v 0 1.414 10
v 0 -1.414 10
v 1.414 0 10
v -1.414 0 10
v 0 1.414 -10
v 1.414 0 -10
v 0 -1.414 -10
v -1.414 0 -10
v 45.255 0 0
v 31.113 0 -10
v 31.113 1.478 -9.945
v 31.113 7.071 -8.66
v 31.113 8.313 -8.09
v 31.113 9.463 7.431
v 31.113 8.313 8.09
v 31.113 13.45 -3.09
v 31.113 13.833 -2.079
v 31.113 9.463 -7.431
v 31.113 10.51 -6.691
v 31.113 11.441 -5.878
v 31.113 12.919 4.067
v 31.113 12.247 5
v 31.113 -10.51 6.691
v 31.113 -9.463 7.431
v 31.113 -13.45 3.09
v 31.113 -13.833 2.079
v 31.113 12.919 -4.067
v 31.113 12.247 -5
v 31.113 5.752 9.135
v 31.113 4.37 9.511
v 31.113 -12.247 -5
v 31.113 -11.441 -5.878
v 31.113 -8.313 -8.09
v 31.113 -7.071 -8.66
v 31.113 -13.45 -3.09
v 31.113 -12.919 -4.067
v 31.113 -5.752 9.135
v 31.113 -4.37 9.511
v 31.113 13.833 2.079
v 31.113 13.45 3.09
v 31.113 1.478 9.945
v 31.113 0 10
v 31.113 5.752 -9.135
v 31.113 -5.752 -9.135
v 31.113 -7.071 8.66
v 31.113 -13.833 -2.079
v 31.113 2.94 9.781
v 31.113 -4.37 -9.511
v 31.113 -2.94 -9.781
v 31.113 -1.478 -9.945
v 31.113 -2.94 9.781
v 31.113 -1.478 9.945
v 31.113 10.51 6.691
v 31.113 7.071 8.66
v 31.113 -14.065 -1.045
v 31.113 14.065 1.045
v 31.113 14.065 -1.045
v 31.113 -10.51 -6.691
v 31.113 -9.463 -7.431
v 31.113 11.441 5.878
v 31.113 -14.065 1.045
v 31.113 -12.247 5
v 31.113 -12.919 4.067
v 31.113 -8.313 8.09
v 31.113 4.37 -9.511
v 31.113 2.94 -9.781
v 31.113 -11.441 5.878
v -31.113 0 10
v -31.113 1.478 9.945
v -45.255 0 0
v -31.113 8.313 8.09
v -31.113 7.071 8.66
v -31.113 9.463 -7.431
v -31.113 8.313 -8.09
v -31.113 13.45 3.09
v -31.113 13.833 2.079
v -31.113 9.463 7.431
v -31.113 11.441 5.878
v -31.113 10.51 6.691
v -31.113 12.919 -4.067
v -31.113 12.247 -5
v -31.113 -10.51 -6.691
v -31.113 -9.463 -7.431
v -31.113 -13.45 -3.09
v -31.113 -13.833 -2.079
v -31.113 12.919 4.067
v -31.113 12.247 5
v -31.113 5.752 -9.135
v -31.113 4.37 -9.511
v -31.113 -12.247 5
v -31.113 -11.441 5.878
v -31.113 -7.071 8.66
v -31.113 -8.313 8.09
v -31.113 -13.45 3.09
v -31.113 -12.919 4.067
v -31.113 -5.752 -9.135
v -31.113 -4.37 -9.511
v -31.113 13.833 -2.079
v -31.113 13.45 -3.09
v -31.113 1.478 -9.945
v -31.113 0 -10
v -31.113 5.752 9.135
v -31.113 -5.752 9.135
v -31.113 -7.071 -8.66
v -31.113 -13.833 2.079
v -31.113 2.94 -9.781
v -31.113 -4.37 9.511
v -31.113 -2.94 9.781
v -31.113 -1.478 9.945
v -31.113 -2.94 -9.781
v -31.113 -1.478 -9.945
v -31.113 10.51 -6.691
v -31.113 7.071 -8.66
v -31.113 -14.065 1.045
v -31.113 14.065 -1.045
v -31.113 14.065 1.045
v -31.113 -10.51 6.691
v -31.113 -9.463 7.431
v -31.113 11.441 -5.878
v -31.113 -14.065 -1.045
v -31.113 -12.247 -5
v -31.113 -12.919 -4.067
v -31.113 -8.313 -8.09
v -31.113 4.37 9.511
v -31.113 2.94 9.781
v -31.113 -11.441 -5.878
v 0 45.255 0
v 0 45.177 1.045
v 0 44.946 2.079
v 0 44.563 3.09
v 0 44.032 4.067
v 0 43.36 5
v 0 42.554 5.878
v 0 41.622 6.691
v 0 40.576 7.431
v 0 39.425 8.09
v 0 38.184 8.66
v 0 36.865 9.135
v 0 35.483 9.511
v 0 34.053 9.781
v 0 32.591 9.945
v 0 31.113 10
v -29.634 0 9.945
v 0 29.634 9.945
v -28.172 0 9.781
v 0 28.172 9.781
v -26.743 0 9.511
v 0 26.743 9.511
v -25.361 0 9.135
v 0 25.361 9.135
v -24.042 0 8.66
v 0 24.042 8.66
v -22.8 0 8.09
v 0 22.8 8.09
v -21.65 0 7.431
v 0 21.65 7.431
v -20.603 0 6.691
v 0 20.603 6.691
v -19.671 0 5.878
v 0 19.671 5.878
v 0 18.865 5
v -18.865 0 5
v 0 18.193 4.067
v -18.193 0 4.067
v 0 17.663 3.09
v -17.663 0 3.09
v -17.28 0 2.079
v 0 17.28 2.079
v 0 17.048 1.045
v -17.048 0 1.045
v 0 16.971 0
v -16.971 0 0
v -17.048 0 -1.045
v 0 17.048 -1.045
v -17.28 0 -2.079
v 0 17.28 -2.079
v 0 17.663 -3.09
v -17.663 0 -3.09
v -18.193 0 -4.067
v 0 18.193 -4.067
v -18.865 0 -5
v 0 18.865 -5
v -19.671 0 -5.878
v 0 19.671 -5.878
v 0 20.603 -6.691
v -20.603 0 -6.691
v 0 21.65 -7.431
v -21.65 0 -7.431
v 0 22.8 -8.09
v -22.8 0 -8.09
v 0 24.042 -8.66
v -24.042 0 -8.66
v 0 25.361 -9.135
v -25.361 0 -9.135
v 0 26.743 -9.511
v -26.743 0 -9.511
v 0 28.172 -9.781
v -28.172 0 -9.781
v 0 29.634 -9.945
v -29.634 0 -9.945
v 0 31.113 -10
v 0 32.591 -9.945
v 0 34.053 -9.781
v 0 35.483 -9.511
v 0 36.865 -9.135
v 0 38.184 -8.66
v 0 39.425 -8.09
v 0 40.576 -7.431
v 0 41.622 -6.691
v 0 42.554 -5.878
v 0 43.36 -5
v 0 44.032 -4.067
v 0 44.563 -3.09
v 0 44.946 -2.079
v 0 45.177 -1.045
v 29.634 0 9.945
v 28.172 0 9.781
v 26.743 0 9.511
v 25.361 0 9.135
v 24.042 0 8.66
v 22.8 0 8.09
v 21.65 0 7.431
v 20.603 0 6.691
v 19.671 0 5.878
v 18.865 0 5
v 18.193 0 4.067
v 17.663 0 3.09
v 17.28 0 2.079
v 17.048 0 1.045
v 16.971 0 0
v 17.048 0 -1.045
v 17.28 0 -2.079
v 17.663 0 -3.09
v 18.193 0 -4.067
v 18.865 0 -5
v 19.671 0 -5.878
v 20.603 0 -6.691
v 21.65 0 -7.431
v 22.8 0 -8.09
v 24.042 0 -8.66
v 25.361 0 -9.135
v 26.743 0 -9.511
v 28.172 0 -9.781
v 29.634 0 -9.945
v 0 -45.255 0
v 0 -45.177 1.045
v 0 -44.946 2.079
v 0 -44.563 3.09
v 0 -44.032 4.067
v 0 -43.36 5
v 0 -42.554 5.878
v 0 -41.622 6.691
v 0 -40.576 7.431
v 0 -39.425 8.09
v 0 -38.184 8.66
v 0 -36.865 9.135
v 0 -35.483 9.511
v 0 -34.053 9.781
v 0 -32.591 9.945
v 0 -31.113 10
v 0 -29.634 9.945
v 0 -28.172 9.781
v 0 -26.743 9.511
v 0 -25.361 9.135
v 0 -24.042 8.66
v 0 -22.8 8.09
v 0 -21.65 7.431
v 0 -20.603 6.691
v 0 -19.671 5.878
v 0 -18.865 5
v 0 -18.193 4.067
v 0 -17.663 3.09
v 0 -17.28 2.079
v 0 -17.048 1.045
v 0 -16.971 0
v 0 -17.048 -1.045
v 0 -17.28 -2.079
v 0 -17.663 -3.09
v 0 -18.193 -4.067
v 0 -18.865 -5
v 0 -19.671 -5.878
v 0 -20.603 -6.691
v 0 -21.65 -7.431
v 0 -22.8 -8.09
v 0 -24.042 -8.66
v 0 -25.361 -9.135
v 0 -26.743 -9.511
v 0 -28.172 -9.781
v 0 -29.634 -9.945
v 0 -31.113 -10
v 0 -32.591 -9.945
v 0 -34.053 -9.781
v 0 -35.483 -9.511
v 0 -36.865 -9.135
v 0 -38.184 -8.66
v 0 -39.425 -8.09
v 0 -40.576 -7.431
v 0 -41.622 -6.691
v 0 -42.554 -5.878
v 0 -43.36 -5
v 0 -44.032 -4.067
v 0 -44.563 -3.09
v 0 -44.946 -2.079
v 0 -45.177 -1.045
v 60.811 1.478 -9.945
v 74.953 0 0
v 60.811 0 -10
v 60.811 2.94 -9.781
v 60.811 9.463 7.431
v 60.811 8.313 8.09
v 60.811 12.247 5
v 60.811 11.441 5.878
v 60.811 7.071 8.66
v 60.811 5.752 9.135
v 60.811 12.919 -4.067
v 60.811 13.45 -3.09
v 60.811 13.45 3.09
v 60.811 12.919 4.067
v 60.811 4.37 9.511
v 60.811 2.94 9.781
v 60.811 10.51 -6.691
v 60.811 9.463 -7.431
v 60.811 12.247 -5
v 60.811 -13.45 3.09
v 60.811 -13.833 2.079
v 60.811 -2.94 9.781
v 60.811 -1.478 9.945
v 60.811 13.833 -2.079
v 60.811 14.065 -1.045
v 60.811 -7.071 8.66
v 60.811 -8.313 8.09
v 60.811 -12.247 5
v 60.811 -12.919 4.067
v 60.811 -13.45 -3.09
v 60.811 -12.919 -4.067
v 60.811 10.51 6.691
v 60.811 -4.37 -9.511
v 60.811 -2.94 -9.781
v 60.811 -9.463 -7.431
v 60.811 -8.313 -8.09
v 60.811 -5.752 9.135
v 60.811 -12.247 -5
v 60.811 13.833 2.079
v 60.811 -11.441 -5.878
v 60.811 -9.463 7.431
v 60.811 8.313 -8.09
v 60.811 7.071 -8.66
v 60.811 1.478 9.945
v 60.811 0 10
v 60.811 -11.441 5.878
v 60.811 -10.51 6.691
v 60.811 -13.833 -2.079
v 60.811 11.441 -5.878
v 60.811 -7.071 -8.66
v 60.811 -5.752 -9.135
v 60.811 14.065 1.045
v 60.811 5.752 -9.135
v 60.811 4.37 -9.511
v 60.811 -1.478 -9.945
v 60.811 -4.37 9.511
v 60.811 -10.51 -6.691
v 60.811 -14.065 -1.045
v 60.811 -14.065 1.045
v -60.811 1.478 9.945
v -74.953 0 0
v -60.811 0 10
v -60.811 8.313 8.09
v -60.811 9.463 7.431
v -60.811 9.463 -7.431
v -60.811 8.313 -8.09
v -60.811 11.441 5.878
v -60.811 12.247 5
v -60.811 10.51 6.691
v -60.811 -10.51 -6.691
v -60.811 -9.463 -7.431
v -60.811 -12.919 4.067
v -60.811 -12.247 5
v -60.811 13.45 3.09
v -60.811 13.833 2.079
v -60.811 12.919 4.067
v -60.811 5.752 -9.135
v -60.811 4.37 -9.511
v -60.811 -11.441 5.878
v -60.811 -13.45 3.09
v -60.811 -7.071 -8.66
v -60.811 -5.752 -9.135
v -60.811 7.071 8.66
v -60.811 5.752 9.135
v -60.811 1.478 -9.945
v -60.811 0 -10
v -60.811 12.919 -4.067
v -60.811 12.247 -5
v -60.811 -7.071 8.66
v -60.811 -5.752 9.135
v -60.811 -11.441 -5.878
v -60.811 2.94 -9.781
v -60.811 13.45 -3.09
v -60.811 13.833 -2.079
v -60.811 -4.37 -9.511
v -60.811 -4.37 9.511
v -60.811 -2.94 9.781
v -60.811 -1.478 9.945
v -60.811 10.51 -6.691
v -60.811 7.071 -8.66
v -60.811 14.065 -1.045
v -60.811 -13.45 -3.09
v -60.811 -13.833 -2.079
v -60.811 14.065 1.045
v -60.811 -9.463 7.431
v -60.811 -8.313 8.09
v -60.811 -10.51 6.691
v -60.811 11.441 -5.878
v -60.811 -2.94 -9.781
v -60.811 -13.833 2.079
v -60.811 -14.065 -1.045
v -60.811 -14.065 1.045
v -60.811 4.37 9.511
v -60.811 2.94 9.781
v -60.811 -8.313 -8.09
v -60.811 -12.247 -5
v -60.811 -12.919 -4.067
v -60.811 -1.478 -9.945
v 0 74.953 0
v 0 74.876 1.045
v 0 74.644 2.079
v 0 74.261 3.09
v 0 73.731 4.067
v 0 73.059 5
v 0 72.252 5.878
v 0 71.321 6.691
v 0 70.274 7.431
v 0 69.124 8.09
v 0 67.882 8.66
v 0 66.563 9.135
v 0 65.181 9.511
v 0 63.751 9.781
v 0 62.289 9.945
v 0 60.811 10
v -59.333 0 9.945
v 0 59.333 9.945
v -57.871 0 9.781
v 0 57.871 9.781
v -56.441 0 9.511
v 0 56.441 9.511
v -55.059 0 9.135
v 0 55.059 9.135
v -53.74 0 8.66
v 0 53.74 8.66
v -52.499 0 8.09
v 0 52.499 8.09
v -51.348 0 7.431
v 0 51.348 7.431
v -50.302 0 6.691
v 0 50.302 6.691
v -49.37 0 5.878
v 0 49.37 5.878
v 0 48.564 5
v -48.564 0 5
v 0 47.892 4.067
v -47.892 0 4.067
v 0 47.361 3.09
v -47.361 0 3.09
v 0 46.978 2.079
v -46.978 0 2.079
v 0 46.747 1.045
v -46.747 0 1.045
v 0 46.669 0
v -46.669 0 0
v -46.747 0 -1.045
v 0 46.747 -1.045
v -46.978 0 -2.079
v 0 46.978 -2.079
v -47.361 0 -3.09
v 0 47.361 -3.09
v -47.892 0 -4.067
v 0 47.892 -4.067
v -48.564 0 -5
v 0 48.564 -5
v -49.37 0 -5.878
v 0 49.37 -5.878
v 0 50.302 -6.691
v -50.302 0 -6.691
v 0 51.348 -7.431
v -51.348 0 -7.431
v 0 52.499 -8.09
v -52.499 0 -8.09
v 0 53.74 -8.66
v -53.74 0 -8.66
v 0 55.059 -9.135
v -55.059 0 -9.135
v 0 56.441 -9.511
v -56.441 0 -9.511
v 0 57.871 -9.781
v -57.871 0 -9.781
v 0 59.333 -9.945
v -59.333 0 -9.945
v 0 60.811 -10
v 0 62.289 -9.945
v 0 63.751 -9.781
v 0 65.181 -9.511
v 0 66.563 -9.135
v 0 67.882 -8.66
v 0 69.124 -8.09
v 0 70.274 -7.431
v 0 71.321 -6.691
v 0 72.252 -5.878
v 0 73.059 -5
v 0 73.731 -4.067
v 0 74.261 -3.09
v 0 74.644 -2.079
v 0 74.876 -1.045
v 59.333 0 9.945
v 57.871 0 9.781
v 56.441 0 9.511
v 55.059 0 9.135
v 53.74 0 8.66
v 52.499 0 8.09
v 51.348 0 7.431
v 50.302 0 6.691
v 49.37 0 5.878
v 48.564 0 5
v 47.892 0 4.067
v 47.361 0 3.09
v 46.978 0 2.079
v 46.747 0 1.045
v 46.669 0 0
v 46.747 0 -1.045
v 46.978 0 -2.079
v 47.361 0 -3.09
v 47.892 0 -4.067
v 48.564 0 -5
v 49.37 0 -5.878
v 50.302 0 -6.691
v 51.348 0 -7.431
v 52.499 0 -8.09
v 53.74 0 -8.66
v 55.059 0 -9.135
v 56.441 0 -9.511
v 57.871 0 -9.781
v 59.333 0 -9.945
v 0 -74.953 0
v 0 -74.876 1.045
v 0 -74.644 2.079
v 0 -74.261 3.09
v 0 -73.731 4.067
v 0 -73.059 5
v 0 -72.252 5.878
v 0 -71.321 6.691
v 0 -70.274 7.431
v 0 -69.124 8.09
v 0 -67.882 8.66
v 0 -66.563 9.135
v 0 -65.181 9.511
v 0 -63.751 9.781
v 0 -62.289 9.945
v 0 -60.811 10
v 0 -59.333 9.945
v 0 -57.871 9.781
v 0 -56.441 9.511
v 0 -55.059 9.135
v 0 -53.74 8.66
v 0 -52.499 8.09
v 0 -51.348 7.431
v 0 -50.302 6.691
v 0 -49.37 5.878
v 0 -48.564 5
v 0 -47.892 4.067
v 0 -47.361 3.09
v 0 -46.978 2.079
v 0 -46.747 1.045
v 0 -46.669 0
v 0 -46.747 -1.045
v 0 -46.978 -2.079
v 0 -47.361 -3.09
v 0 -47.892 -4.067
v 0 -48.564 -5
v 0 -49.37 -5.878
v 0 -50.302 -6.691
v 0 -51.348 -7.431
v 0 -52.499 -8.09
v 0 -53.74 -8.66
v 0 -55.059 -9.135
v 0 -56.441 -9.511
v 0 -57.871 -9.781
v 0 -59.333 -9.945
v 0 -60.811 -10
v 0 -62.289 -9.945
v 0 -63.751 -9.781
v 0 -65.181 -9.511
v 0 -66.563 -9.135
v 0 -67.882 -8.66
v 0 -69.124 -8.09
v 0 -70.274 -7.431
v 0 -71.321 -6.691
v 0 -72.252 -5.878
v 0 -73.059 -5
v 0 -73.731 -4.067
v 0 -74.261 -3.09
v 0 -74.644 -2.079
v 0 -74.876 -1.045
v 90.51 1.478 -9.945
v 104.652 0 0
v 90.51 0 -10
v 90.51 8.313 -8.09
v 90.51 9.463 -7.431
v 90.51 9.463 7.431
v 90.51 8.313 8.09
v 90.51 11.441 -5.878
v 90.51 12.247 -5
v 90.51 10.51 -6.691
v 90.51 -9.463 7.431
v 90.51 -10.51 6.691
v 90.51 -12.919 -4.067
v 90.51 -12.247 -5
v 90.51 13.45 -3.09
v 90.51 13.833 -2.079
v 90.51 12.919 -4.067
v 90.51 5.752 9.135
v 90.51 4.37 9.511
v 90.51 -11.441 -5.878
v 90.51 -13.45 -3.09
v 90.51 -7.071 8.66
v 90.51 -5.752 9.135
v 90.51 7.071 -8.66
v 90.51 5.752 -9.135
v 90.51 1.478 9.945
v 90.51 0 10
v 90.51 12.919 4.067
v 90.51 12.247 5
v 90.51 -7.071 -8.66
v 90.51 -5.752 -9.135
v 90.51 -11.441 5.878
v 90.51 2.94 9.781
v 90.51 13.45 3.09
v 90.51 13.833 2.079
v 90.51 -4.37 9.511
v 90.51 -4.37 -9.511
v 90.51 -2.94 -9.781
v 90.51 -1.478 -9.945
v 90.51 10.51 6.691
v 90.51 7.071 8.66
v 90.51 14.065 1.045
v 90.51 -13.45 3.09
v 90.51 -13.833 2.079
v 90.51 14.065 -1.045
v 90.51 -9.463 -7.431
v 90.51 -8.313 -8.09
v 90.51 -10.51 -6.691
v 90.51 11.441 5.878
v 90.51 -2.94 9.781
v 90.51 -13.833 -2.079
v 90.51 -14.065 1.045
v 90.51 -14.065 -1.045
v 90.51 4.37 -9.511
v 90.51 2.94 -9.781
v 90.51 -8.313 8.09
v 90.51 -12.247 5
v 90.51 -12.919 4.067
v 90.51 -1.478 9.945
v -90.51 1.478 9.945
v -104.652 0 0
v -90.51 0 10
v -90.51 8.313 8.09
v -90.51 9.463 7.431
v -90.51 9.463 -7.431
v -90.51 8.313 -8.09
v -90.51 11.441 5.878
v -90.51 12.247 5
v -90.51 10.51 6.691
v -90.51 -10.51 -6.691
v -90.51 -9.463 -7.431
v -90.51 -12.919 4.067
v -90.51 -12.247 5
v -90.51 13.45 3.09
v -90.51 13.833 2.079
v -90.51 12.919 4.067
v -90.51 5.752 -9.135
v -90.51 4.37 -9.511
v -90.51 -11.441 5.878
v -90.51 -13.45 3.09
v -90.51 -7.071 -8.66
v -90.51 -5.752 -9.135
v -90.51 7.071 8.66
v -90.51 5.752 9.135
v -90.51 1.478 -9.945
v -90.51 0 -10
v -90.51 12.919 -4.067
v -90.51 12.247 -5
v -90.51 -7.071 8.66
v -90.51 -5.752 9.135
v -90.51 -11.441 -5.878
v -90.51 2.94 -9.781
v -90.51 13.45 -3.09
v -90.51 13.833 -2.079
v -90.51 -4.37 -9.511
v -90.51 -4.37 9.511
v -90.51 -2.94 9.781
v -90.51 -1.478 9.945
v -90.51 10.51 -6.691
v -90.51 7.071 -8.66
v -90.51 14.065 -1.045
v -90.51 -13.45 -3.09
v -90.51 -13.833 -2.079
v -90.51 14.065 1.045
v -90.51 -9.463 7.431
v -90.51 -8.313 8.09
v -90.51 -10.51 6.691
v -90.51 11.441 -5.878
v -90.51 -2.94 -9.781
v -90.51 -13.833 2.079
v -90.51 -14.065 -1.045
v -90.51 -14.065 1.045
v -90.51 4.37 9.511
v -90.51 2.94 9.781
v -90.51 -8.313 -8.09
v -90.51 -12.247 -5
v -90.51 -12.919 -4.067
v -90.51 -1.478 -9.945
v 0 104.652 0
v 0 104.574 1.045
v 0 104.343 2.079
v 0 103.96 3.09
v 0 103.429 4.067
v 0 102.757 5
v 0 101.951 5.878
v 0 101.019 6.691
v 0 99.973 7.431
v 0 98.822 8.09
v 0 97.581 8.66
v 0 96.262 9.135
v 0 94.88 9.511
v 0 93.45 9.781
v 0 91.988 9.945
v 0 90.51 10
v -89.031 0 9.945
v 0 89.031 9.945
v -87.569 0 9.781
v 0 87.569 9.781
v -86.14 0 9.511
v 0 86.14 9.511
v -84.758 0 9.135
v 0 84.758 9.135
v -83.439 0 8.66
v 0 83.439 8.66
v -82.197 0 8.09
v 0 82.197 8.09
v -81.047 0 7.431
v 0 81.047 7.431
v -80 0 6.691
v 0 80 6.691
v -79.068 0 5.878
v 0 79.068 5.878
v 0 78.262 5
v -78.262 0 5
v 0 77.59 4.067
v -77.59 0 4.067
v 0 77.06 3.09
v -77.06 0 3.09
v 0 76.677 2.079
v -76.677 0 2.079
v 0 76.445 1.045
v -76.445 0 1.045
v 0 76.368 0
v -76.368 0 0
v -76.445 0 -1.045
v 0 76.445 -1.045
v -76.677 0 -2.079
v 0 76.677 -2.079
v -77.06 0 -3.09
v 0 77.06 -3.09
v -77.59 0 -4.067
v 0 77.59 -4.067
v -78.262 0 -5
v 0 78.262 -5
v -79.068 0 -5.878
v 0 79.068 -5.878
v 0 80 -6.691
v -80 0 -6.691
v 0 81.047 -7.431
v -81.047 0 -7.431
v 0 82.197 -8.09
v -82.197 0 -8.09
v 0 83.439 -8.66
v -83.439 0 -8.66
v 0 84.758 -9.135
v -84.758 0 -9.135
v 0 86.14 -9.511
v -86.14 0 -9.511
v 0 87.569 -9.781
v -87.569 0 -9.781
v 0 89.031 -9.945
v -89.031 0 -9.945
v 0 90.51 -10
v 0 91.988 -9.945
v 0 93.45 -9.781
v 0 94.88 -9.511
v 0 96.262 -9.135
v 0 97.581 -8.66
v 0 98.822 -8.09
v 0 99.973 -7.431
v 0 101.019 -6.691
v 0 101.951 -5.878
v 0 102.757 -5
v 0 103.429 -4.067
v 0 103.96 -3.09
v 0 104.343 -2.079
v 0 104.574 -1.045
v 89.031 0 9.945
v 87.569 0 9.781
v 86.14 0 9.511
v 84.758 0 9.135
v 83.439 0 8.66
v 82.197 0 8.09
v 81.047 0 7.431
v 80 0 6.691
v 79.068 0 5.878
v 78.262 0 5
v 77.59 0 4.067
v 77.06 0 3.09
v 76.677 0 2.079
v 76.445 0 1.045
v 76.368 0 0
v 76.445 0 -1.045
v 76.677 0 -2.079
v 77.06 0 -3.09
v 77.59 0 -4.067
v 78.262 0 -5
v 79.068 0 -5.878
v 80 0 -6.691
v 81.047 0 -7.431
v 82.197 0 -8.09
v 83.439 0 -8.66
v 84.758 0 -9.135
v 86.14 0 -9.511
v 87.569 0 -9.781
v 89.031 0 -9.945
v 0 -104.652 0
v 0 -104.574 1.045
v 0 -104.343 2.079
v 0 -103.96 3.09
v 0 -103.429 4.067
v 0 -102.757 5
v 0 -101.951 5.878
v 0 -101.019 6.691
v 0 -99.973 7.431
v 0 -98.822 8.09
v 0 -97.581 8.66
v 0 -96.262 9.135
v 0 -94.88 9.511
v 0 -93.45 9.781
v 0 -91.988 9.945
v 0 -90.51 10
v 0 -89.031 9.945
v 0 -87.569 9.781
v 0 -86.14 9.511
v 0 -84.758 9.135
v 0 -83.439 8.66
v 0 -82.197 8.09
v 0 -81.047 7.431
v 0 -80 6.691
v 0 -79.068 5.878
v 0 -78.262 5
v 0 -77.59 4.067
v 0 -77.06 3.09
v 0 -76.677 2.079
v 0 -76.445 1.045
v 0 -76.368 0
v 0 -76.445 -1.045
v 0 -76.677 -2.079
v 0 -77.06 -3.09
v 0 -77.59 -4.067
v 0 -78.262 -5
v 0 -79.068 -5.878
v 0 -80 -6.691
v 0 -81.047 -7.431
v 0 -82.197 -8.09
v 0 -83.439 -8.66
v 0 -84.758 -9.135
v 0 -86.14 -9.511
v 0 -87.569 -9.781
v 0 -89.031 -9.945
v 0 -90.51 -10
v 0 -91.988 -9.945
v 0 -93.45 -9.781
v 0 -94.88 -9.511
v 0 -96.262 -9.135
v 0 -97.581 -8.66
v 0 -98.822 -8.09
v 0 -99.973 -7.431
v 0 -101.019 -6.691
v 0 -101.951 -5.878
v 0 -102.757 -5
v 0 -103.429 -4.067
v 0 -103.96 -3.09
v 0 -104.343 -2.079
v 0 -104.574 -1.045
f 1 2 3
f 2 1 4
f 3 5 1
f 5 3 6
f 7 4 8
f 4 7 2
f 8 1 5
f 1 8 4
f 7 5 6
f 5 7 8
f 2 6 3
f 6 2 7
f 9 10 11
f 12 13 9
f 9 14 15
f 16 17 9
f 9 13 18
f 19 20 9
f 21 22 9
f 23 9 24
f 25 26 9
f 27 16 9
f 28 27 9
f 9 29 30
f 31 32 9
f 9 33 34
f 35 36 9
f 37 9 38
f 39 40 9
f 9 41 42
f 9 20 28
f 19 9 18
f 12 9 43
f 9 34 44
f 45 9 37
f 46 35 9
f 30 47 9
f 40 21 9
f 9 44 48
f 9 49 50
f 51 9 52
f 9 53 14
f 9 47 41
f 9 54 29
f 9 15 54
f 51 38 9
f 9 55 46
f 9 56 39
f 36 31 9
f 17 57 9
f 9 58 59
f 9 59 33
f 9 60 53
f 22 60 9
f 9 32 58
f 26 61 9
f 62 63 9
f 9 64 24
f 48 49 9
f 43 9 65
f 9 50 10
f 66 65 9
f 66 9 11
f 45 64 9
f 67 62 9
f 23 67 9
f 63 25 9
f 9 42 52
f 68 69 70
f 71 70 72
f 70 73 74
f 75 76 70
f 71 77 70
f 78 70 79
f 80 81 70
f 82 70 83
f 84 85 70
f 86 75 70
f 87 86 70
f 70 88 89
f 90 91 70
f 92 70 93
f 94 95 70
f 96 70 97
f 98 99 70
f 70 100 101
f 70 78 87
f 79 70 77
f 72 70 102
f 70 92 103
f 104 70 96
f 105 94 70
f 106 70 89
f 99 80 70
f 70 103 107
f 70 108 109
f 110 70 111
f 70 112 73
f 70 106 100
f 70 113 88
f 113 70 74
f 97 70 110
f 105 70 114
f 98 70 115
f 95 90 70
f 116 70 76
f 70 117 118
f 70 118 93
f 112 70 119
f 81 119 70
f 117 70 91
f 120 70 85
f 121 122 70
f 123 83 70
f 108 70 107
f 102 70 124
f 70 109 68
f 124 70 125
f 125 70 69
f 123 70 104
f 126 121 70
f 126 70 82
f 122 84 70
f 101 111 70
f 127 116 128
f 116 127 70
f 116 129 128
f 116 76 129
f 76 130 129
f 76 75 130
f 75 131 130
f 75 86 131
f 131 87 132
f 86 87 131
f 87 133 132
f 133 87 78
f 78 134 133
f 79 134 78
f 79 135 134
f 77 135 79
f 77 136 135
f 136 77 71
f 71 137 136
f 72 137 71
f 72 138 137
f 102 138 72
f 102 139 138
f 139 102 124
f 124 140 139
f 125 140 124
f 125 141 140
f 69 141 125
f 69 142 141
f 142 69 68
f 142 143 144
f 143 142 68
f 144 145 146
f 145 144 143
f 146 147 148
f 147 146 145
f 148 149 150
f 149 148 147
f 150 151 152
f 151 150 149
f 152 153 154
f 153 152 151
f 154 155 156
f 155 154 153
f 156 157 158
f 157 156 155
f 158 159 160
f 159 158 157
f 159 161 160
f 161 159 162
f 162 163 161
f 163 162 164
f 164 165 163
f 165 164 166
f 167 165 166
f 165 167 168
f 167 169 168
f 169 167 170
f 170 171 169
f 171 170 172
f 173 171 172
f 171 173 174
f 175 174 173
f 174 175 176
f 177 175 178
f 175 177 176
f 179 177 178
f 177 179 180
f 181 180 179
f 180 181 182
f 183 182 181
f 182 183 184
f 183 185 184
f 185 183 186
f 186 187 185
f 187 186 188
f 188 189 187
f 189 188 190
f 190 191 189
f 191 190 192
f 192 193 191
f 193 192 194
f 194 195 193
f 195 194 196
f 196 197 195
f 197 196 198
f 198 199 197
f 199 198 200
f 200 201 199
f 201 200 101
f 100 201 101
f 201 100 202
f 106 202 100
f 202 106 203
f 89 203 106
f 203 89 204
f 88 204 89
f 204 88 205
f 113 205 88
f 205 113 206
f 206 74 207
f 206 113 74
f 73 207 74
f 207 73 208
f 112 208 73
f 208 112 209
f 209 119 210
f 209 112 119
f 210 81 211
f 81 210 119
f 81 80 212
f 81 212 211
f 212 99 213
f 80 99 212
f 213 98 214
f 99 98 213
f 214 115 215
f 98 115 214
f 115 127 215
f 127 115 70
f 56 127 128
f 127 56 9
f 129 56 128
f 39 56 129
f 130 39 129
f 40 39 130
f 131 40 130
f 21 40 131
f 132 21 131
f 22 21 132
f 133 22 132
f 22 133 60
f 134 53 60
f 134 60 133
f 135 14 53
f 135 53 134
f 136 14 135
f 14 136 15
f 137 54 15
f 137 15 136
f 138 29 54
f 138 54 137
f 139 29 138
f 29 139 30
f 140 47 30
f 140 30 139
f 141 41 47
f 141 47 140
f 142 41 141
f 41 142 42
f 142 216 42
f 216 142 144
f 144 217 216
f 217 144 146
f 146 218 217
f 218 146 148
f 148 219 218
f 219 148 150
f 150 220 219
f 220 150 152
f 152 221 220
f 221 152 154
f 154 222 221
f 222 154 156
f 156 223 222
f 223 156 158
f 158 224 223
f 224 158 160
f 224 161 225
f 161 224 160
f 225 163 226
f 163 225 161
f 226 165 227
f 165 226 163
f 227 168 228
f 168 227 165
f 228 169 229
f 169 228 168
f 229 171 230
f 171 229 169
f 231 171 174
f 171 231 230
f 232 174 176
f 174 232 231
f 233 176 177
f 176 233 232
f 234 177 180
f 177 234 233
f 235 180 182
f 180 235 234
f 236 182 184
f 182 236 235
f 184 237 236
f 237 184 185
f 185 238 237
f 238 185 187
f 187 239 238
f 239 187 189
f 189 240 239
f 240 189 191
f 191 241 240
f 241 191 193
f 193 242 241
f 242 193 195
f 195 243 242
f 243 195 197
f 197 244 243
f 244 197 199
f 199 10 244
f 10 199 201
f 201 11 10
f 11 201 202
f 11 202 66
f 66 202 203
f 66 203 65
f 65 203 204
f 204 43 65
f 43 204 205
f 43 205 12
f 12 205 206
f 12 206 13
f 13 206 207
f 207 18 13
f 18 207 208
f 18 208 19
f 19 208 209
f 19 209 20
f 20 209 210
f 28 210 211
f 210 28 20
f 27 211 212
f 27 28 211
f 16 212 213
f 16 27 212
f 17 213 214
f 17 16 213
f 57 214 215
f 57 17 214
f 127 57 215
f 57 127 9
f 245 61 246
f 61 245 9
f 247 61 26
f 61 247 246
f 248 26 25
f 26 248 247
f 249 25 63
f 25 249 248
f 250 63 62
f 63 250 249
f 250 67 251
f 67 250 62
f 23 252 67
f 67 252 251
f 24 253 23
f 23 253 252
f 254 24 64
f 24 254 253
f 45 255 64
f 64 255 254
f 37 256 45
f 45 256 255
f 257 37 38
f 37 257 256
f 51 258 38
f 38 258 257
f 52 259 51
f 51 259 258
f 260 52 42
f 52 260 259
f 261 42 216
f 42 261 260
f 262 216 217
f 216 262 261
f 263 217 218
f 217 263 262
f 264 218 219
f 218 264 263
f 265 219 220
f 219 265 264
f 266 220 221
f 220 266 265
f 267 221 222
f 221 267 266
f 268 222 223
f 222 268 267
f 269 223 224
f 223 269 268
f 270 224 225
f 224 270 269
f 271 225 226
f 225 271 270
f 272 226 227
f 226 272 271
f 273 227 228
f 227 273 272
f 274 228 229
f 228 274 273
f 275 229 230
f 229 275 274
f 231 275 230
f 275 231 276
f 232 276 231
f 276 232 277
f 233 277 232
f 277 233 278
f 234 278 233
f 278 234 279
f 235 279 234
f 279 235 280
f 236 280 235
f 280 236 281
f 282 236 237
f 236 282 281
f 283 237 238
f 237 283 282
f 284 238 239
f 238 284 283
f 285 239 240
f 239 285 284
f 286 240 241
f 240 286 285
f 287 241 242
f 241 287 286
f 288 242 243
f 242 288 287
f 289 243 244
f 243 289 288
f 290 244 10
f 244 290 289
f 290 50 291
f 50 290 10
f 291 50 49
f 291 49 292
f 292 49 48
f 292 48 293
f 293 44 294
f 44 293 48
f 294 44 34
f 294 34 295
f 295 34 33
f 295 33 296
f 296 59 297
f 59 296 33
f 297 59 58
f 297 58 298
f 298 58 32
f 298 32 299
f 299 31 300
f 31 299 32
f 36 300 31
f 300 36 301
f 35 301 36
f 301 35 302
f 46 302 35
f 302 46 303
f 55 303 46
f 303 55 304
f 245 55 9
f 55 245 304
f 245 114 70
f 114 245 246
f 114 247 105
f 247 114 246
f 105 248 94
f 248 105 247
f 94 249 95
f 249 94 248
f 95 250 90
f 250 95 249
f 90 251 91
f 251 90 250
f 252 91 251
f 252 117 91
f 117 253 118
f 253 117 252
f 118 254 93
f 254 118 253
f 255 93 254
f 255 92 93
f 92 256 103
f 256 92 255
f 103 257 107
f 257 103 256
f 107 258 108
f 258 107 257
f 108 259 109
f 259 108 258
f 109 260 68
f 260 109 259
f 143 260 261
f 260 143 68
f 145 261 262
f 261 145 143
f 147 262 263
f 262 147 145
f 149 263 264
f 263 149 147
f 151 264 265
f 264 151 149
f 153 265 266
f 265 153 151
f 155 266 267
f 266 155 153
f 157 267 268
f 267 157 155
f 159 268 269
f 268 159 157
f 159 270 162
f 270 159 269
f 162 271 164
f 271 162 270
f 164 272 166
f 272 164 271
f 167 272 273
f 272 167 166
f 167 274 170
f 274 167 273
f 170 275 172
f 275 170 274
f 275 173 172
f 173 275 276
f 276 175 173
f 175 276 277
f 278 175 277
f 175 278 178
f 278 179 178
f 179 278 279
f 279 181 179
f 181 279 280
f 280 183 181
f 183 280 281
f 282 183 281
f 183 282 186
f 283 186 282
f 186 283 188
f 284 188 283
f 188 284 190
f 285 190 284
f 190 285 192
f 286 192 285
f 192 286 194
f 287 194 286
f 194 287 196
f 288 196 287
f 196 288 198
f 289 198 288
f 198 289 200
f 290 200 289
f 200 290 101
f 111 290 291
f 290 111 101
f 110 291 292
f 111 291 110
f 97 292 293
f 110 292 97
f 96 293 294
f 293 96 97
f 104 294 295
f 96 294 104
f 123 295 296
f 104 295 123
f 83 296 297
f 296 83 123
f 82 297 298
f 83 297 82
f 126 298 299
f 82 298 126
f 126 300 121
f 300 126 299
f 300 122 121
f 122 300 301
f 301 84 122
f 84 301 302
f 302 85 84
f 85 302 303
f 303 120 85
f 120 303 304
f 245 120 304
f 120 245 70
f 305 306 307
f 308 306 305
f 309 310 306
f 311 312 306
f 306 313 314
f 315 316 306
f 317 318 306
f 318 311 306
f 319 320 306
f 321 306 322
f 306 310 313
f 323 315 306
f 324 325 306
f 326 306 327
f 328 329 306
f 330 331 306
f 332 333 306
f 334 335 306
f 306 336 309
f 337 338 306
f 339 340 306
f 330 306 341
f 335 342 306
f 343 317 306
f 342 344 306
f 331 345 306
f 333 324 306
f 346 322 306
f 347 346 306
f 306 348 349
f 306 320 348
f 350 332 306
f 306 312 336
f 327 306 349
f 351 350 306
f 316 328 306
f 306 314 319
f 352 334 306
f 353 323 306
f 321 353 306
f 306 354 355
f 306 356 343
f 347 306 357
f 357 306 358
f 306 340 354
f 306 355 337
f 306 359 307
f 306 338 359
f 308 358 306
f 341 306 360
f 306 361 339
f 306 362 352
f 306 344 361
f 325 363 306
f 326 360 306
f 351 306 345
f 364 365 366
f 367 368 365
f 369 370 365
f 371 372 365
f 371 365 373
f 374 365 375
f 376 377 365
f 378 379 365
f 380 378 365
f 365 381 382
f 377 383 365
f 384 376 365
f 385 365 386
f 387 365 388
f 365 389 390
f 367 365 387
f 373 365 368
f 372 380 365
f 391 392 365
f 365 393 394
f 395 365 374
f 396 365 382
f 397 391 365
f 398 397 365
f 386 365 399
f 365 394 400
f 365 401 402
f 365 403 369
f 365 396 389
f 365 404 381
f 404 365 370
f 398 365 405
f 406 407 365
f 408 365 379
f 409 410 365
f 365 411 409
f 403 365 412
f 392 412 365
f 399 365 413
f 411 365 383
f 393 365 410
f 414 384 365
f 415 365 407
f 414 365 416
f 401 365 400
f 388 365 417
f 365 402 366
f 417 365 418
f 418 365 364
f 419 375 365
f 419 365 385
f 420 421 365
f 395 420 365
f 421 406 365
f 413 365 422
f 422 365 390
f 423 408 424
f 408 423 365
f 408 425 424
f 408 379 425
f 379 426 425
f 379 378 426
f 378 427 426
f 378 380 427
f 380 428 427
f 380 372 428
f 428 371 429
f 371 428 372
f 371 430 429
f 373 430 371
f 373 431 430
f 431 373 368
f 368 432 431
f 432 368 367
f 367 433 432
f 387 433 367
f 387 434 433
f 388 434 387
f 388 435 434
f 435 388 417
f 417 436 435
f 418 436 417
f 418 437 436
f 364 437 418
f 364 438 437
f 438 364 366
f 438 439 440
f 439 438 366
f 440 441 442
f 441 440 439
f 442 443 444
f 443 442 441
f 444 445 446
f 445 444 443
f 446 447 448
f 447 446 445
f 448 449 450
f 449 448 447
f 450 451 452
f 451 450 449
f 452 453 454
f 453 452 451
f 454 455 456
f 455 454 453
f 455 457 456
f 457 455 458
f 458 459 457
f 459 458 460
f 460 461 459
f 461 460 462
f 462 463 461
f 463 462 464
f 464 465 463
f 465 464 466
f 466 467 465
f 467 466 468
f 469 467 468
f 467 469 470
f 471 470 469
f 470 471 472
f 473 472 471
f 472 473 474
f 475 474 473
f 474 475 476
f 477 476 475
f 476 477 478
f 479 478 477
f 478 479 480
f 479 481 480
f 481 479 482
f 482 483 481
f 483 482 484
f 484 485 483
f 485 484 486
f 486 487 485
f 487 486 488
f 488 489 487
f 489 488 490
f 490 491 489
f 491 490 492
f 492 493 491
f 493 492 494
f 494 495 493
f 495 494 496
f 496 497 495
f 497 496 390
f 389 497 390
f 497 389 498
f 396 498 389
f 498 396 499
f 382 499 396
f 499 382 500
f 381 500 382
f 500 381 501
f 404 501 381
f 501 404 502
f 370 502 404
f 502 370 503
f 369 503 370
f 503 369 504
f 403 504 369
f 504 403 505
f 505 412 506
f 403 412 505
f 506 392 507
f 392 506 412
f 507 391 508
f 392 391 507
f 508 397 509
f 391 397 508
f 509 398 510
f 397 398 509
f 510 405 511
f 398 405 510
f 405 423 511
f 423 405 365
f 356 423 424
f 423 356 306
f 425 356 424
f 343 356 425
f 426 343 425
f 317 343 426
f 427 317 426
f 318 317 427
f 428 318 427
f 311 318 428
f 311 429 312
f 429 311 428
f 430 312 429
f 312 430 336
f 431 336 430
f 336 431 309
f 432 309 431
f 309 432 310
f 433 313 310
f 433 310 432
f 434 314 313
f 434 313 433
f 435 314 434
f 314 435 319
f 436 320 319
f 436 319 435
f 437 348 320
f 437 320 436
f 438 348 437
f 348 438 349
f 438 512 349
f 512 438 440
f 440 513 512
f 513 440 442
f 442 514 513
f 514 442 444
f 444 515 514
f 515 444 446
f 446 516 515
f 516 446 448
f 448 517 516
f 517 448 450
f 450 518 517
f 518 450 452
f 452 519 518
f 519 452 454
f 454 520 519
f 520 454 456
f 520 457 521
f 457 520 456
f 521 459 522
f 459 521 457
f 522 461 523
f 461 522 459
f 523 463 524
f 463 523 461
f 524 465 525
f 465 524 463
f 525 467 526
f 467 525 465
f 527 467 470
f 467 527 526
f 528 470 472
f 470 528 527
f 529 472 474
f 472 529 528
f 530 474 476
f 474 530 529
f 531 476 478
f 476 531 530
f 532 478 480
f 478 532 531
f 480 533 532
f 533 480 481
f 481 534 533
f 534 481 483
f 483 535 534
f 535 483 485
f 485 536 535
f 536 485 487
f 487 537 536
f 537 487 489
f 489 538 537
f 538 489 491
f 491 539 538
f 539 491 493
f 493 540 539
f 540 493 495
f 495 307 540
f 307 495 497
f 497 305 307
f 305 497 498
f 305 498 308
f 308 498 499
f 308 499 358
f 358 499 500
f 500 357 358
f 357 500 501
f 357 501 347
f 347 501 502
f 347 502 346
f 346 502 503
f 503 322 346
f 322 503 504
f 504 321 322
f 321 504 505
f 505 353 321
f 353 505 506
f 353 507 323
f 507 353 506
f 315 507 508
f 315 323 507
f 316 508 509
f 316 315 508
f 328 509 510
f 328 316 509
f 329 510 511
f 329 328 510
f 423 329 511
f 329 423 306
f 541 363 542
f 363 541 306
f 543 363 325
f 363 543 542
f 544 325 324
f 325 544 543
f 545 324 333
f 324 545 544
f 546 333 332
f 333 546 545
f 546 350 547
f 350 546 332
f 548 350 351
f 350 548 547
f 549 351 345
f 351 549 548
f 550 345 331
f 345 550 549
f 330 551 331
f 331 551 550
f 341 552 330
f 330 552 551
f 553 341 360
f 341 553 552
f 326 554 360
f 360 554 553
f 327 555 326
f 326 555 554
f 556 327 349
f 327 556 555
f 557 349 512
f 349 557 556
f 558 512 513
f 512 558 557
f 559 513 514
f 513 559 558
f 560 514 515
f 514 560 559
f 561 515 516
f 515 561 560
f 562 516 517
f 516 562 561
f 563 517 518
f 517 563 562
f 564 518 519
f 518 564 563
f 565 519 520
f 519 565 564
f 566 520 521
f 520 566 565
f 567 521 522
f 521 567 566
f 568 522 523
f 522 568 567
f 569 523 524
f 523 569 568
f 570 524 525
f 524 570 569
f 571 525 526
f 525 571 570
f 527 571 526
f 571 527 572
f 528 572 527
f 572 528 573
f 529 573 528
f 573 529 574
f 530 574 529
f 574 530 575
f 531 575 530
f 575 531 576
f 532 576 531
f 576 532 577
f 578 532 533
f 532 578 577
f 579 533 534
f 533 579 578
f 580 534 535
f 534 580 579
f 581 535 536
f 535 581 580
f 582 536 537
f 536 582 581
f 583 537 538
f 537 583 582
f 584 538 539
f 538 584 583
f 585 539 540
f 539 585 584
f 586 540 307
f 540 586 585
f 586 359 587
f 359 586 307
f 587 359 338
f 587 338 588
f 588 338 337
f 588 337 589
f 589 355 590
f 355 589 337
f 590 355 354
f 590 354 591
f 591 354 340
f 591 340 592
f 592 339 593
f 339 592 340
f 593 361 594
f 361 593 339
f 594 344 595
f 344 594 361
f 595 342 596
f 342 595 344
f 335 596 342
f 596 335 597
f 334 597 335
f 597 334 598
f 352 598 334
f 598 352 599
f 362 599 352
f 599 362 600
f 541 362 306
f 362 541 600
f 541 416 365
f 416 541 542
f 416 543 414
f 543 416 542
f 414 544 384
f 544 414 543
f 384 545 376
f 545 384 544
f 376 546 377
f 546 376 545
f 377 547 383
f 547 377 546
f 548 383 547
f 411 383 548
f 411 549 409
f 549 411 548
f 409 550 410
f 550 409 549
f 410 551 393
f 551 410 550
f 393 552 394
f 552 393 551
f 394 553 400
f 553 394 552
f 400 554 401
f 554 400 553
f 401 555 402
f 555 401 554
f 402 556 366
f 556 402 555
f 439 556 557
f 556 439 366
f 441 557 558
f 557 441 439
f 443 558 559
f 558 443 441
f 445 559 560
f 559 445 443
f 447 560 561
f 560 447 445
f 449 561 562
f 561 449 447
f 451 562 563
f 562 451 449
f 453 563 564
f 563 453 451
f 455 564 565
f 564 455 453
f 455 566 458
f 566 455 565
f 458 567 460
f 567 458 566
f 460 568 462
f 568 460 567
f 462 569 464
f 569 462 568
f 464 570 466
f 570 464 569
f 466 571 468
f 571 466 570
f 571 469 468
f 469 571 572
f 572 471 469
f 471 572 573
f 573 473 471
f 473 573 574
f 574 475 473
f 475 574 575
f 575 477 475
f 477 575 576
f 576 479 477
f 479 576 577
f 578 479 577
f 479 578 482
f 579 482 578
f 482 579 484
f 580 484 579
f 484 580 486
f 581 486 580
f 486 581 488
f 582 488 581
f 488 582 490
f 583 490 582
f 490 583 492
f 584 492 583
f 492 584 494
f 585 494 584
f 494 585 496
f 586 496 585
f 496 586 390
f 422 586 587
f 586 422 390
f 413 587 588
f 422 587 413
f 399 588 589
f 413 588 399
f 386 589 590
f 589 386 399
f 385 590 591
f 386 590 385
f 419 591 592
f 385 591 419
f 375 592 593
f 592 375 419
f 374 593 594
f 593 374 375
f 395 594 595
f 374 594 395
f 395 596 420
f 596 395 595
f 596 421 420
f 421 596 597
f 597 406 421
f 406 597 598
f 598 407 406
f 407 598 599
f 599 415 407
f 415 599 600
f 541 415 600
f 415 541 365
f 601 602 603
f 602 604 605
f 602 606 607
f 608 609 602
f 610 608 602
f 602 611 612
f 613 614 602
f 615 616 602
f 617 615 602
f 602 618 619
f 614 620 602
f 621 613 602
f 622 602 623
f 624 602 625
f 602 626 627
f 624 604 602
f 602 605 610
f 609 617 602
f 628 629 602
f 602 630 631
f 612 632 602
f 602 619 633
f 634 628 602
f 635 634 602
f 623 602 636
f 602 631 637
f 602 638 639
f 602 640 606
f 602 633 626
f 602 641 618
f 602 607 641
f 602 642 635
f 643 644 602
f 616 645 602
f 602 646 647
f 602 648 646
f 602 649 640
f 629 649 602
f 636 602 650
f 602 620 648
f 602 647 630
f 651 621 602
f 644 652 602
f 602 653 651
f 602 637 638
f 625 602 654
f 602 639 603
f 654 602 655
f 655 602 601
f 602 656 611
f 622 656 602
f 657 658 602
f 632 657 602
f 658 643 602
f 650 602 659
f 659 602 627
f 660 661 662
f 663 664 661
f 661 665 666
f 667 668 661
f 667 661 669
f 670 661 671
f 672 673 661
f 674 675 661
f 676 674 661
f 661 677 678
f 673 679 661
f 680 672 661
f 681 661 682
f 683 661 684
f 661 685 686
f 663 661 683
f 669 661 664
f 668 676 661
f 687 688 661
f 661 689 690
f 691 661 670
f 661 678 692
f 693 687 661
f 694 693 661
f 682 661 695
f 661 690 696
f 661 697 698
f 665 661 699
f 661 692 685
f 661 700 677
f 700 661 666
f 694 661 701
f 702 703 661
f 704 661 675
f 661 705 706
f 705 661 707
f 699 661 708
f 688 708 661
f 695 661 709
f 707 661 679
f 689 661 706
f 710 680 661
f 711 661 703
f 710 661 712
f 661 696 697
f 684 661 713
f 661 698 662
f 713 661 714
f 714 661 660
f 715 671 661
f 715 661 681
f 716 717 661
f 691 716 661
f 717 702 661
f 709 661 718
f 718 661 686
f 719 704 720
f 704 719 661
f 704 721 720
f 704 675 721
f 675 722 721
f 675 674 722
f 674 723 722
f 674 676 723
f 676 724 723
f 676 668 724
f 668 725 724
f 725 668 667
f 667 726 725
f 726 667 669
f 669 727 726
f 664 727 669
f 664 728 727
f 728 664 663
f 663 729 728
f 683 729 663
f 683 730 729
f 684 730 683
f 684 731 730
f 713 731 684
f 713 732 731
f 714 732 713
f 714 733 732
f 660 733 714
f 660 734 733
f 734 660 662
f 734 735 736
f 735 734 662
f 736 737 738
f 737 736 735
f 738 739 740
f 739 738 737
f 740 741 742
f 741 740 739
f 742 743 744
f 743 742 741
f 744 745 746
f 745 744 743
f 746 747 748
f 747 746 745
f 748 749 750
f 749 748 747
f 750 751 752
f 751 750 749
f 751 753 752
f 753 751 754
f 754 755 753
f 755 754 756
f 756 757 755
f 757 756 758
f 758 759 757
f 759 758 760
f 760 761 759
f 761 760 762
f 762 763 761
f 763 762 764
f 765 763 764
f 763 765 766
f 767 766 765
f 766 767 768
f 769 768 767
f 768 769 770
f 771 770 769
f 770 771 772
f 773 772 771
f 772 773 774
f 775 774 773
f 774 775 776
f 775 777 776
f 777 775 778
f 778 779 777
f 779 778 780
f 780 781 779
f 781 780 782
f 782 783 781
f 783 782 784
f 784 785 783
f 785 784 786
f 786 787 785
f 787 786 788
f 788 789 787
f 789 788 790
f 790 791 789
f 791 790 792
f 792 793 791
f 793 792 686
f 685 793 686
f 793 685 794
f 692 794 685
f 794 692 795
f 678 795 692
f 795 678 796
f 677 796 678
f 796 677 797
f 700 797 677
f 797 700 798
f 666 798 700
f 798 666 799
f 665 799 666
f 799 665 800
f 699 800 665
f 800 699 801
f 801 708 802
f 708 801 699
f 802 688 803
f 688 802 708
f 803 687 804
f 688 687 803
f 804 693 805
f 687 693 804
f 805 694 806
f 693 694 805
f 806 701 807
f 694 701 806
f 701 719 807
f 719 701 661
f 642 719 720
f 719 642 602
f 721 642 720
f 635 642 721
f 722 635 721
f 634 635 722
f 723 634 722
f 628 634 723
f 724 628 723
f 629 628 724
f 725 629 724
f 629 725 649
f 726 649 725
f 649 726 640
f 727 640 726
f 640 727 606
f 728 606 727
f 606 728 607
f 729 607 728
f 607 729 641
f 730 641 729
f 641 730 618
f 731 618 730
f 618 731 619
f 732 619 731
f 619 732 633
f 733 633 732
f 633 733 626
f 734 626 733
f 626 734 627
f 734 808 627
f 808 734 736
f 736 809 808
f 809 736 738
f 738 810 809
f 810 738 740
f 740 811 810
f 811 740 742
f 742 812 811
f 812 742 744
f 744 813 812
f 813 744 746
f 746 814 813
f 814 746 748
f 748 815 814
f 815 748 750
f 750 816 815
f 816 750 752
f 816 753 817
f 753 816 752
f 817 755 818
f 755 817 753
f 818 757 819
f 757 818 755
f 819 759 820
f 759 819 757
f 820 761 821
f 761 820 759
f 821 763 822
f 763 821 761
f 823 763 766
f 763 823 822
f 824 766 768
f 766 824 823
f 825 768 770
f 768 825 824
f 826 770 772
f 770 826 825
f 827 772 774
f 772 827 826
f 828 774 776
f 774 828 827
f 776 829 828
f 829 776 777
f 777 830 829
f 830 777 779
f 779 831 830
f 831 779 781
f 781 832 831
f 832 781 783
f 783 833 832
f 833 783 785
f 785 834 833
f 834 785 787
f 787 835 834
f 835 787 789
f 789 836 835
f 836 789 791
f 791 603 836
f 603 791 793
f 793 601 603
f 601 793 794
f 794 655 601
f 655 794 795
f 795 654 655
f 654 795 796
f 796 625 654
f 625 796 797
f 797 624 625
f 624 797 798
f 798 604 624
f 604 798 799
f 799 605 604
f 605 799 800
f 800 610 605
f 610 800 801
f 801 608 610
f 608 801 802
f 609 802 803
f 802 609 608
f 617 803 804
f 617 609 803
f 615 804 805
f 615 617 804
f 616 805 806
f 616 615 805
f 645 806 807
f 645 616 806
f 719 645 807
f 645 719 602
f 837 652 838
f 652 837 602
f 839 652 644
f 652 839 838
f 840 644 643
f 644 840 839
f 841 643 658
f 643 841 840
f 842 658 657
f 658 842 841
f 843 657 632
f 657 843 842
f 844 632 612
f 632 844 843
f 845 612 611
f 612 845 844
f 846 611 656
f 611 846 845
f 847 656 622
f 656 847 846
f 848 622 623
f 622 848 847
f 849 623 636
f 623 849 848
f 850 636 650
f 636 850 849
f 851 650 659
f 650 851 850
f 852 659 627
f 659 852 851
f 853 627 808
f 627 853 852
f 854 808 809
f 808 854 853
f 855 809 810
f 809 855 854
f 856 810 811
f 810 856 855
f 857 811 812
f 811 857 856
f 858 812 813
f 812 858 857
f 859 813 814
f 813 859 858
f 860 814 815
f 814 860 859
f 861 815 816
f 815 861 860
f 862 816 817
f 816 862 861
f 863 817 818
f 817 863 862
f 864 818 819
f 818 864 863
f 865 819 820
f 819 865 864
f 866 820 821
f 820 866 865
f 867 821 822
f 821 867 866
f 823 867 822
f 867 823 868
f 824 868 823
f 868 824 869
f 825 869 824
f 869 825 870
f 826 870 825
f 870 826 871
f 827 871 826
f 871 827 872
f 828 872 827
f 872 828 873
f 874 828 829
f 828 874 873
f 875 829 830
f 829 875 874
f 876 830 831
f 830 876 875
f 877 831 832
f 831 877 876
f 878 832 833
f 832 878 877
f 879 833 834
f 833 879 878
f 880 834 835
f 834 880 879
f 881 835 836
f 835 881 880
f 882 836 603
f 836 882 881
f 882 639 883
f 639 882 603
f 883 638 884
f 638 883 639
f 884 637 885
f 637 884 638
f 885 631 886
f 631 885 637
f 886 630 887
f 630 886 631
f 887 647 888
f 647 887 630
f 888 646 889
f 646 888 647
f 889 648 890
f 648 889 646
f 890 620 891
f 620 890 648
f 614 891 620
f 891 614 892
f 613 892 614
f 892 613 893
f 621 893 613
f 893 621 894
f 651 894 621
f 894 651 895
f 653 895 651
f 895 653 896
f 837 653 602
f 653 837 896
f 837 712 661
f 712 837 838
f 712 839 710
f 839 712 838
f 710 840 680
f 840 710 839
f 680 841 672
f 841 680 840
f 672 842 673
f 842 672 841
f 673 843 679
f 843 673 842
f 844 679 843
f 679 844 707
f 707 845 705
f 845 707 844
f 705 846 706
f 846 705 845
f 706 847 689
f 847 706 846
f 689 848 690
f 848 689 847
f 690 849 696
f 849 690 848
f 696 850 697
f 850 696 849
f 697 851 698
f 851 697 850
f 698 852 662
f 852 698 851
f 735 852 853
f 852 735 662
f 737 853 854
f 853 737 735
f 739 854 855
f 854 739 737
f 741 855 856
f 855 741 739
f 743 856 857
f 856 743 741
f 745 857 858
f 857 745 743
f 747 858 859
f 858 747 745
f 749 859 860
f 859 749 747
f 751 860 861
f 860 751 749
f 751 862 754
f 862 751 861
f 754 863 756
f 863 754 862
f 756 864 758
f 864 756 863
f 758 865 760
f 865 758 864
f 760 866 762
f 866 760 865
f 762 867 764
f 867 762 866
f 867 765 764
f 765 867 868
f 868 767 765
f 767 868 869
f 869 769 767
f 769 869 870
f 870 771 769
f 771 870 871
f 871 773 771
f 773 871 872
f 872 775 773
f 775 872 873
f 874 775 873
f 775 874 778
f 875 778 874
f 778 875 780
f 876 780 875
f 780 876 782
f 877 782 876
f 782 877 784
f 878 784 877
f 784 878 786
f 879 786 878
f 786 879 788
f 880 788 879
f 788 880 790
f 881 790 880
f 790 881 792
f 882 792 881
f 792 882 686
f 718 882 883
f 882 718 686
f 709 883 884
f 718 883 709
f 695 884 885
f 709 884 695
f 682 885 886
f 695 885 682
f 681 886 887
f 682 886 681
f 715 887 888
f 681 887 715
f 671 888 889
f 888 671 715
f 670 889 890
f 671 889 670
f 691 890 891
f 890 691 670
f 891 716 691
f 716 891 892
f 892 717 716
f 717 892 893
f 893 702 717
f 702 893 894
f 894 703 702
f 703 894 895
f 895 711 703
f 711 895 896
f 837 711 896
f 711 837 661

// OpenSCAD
module tube_square(r,w,fill=false)
scale([sqrt(2),sqrt(2),1])intersection(){
union(){
rotate([0,90,0])cylinder(r1=r+w,r2=0,h=w+r,$fn=60);
rotate([0,-90,0])cylinder(r1=r+w,r2=0,h=w+r,$fn=60);}
union(){rotate_extrude($fn=4,convexity=4)translate([w,0,0])circle(r=r,$fn=60);
if (fill) rotate(45)cube([sqrt(2)*w,sqrt(2)*w,2*r],center=true);}}

color("white")tube_square(10,1,fill=true);
color("black")tube_square(10,22);
color("white")tube_square(10,43);
color("blue")tube_square(10,64
);
